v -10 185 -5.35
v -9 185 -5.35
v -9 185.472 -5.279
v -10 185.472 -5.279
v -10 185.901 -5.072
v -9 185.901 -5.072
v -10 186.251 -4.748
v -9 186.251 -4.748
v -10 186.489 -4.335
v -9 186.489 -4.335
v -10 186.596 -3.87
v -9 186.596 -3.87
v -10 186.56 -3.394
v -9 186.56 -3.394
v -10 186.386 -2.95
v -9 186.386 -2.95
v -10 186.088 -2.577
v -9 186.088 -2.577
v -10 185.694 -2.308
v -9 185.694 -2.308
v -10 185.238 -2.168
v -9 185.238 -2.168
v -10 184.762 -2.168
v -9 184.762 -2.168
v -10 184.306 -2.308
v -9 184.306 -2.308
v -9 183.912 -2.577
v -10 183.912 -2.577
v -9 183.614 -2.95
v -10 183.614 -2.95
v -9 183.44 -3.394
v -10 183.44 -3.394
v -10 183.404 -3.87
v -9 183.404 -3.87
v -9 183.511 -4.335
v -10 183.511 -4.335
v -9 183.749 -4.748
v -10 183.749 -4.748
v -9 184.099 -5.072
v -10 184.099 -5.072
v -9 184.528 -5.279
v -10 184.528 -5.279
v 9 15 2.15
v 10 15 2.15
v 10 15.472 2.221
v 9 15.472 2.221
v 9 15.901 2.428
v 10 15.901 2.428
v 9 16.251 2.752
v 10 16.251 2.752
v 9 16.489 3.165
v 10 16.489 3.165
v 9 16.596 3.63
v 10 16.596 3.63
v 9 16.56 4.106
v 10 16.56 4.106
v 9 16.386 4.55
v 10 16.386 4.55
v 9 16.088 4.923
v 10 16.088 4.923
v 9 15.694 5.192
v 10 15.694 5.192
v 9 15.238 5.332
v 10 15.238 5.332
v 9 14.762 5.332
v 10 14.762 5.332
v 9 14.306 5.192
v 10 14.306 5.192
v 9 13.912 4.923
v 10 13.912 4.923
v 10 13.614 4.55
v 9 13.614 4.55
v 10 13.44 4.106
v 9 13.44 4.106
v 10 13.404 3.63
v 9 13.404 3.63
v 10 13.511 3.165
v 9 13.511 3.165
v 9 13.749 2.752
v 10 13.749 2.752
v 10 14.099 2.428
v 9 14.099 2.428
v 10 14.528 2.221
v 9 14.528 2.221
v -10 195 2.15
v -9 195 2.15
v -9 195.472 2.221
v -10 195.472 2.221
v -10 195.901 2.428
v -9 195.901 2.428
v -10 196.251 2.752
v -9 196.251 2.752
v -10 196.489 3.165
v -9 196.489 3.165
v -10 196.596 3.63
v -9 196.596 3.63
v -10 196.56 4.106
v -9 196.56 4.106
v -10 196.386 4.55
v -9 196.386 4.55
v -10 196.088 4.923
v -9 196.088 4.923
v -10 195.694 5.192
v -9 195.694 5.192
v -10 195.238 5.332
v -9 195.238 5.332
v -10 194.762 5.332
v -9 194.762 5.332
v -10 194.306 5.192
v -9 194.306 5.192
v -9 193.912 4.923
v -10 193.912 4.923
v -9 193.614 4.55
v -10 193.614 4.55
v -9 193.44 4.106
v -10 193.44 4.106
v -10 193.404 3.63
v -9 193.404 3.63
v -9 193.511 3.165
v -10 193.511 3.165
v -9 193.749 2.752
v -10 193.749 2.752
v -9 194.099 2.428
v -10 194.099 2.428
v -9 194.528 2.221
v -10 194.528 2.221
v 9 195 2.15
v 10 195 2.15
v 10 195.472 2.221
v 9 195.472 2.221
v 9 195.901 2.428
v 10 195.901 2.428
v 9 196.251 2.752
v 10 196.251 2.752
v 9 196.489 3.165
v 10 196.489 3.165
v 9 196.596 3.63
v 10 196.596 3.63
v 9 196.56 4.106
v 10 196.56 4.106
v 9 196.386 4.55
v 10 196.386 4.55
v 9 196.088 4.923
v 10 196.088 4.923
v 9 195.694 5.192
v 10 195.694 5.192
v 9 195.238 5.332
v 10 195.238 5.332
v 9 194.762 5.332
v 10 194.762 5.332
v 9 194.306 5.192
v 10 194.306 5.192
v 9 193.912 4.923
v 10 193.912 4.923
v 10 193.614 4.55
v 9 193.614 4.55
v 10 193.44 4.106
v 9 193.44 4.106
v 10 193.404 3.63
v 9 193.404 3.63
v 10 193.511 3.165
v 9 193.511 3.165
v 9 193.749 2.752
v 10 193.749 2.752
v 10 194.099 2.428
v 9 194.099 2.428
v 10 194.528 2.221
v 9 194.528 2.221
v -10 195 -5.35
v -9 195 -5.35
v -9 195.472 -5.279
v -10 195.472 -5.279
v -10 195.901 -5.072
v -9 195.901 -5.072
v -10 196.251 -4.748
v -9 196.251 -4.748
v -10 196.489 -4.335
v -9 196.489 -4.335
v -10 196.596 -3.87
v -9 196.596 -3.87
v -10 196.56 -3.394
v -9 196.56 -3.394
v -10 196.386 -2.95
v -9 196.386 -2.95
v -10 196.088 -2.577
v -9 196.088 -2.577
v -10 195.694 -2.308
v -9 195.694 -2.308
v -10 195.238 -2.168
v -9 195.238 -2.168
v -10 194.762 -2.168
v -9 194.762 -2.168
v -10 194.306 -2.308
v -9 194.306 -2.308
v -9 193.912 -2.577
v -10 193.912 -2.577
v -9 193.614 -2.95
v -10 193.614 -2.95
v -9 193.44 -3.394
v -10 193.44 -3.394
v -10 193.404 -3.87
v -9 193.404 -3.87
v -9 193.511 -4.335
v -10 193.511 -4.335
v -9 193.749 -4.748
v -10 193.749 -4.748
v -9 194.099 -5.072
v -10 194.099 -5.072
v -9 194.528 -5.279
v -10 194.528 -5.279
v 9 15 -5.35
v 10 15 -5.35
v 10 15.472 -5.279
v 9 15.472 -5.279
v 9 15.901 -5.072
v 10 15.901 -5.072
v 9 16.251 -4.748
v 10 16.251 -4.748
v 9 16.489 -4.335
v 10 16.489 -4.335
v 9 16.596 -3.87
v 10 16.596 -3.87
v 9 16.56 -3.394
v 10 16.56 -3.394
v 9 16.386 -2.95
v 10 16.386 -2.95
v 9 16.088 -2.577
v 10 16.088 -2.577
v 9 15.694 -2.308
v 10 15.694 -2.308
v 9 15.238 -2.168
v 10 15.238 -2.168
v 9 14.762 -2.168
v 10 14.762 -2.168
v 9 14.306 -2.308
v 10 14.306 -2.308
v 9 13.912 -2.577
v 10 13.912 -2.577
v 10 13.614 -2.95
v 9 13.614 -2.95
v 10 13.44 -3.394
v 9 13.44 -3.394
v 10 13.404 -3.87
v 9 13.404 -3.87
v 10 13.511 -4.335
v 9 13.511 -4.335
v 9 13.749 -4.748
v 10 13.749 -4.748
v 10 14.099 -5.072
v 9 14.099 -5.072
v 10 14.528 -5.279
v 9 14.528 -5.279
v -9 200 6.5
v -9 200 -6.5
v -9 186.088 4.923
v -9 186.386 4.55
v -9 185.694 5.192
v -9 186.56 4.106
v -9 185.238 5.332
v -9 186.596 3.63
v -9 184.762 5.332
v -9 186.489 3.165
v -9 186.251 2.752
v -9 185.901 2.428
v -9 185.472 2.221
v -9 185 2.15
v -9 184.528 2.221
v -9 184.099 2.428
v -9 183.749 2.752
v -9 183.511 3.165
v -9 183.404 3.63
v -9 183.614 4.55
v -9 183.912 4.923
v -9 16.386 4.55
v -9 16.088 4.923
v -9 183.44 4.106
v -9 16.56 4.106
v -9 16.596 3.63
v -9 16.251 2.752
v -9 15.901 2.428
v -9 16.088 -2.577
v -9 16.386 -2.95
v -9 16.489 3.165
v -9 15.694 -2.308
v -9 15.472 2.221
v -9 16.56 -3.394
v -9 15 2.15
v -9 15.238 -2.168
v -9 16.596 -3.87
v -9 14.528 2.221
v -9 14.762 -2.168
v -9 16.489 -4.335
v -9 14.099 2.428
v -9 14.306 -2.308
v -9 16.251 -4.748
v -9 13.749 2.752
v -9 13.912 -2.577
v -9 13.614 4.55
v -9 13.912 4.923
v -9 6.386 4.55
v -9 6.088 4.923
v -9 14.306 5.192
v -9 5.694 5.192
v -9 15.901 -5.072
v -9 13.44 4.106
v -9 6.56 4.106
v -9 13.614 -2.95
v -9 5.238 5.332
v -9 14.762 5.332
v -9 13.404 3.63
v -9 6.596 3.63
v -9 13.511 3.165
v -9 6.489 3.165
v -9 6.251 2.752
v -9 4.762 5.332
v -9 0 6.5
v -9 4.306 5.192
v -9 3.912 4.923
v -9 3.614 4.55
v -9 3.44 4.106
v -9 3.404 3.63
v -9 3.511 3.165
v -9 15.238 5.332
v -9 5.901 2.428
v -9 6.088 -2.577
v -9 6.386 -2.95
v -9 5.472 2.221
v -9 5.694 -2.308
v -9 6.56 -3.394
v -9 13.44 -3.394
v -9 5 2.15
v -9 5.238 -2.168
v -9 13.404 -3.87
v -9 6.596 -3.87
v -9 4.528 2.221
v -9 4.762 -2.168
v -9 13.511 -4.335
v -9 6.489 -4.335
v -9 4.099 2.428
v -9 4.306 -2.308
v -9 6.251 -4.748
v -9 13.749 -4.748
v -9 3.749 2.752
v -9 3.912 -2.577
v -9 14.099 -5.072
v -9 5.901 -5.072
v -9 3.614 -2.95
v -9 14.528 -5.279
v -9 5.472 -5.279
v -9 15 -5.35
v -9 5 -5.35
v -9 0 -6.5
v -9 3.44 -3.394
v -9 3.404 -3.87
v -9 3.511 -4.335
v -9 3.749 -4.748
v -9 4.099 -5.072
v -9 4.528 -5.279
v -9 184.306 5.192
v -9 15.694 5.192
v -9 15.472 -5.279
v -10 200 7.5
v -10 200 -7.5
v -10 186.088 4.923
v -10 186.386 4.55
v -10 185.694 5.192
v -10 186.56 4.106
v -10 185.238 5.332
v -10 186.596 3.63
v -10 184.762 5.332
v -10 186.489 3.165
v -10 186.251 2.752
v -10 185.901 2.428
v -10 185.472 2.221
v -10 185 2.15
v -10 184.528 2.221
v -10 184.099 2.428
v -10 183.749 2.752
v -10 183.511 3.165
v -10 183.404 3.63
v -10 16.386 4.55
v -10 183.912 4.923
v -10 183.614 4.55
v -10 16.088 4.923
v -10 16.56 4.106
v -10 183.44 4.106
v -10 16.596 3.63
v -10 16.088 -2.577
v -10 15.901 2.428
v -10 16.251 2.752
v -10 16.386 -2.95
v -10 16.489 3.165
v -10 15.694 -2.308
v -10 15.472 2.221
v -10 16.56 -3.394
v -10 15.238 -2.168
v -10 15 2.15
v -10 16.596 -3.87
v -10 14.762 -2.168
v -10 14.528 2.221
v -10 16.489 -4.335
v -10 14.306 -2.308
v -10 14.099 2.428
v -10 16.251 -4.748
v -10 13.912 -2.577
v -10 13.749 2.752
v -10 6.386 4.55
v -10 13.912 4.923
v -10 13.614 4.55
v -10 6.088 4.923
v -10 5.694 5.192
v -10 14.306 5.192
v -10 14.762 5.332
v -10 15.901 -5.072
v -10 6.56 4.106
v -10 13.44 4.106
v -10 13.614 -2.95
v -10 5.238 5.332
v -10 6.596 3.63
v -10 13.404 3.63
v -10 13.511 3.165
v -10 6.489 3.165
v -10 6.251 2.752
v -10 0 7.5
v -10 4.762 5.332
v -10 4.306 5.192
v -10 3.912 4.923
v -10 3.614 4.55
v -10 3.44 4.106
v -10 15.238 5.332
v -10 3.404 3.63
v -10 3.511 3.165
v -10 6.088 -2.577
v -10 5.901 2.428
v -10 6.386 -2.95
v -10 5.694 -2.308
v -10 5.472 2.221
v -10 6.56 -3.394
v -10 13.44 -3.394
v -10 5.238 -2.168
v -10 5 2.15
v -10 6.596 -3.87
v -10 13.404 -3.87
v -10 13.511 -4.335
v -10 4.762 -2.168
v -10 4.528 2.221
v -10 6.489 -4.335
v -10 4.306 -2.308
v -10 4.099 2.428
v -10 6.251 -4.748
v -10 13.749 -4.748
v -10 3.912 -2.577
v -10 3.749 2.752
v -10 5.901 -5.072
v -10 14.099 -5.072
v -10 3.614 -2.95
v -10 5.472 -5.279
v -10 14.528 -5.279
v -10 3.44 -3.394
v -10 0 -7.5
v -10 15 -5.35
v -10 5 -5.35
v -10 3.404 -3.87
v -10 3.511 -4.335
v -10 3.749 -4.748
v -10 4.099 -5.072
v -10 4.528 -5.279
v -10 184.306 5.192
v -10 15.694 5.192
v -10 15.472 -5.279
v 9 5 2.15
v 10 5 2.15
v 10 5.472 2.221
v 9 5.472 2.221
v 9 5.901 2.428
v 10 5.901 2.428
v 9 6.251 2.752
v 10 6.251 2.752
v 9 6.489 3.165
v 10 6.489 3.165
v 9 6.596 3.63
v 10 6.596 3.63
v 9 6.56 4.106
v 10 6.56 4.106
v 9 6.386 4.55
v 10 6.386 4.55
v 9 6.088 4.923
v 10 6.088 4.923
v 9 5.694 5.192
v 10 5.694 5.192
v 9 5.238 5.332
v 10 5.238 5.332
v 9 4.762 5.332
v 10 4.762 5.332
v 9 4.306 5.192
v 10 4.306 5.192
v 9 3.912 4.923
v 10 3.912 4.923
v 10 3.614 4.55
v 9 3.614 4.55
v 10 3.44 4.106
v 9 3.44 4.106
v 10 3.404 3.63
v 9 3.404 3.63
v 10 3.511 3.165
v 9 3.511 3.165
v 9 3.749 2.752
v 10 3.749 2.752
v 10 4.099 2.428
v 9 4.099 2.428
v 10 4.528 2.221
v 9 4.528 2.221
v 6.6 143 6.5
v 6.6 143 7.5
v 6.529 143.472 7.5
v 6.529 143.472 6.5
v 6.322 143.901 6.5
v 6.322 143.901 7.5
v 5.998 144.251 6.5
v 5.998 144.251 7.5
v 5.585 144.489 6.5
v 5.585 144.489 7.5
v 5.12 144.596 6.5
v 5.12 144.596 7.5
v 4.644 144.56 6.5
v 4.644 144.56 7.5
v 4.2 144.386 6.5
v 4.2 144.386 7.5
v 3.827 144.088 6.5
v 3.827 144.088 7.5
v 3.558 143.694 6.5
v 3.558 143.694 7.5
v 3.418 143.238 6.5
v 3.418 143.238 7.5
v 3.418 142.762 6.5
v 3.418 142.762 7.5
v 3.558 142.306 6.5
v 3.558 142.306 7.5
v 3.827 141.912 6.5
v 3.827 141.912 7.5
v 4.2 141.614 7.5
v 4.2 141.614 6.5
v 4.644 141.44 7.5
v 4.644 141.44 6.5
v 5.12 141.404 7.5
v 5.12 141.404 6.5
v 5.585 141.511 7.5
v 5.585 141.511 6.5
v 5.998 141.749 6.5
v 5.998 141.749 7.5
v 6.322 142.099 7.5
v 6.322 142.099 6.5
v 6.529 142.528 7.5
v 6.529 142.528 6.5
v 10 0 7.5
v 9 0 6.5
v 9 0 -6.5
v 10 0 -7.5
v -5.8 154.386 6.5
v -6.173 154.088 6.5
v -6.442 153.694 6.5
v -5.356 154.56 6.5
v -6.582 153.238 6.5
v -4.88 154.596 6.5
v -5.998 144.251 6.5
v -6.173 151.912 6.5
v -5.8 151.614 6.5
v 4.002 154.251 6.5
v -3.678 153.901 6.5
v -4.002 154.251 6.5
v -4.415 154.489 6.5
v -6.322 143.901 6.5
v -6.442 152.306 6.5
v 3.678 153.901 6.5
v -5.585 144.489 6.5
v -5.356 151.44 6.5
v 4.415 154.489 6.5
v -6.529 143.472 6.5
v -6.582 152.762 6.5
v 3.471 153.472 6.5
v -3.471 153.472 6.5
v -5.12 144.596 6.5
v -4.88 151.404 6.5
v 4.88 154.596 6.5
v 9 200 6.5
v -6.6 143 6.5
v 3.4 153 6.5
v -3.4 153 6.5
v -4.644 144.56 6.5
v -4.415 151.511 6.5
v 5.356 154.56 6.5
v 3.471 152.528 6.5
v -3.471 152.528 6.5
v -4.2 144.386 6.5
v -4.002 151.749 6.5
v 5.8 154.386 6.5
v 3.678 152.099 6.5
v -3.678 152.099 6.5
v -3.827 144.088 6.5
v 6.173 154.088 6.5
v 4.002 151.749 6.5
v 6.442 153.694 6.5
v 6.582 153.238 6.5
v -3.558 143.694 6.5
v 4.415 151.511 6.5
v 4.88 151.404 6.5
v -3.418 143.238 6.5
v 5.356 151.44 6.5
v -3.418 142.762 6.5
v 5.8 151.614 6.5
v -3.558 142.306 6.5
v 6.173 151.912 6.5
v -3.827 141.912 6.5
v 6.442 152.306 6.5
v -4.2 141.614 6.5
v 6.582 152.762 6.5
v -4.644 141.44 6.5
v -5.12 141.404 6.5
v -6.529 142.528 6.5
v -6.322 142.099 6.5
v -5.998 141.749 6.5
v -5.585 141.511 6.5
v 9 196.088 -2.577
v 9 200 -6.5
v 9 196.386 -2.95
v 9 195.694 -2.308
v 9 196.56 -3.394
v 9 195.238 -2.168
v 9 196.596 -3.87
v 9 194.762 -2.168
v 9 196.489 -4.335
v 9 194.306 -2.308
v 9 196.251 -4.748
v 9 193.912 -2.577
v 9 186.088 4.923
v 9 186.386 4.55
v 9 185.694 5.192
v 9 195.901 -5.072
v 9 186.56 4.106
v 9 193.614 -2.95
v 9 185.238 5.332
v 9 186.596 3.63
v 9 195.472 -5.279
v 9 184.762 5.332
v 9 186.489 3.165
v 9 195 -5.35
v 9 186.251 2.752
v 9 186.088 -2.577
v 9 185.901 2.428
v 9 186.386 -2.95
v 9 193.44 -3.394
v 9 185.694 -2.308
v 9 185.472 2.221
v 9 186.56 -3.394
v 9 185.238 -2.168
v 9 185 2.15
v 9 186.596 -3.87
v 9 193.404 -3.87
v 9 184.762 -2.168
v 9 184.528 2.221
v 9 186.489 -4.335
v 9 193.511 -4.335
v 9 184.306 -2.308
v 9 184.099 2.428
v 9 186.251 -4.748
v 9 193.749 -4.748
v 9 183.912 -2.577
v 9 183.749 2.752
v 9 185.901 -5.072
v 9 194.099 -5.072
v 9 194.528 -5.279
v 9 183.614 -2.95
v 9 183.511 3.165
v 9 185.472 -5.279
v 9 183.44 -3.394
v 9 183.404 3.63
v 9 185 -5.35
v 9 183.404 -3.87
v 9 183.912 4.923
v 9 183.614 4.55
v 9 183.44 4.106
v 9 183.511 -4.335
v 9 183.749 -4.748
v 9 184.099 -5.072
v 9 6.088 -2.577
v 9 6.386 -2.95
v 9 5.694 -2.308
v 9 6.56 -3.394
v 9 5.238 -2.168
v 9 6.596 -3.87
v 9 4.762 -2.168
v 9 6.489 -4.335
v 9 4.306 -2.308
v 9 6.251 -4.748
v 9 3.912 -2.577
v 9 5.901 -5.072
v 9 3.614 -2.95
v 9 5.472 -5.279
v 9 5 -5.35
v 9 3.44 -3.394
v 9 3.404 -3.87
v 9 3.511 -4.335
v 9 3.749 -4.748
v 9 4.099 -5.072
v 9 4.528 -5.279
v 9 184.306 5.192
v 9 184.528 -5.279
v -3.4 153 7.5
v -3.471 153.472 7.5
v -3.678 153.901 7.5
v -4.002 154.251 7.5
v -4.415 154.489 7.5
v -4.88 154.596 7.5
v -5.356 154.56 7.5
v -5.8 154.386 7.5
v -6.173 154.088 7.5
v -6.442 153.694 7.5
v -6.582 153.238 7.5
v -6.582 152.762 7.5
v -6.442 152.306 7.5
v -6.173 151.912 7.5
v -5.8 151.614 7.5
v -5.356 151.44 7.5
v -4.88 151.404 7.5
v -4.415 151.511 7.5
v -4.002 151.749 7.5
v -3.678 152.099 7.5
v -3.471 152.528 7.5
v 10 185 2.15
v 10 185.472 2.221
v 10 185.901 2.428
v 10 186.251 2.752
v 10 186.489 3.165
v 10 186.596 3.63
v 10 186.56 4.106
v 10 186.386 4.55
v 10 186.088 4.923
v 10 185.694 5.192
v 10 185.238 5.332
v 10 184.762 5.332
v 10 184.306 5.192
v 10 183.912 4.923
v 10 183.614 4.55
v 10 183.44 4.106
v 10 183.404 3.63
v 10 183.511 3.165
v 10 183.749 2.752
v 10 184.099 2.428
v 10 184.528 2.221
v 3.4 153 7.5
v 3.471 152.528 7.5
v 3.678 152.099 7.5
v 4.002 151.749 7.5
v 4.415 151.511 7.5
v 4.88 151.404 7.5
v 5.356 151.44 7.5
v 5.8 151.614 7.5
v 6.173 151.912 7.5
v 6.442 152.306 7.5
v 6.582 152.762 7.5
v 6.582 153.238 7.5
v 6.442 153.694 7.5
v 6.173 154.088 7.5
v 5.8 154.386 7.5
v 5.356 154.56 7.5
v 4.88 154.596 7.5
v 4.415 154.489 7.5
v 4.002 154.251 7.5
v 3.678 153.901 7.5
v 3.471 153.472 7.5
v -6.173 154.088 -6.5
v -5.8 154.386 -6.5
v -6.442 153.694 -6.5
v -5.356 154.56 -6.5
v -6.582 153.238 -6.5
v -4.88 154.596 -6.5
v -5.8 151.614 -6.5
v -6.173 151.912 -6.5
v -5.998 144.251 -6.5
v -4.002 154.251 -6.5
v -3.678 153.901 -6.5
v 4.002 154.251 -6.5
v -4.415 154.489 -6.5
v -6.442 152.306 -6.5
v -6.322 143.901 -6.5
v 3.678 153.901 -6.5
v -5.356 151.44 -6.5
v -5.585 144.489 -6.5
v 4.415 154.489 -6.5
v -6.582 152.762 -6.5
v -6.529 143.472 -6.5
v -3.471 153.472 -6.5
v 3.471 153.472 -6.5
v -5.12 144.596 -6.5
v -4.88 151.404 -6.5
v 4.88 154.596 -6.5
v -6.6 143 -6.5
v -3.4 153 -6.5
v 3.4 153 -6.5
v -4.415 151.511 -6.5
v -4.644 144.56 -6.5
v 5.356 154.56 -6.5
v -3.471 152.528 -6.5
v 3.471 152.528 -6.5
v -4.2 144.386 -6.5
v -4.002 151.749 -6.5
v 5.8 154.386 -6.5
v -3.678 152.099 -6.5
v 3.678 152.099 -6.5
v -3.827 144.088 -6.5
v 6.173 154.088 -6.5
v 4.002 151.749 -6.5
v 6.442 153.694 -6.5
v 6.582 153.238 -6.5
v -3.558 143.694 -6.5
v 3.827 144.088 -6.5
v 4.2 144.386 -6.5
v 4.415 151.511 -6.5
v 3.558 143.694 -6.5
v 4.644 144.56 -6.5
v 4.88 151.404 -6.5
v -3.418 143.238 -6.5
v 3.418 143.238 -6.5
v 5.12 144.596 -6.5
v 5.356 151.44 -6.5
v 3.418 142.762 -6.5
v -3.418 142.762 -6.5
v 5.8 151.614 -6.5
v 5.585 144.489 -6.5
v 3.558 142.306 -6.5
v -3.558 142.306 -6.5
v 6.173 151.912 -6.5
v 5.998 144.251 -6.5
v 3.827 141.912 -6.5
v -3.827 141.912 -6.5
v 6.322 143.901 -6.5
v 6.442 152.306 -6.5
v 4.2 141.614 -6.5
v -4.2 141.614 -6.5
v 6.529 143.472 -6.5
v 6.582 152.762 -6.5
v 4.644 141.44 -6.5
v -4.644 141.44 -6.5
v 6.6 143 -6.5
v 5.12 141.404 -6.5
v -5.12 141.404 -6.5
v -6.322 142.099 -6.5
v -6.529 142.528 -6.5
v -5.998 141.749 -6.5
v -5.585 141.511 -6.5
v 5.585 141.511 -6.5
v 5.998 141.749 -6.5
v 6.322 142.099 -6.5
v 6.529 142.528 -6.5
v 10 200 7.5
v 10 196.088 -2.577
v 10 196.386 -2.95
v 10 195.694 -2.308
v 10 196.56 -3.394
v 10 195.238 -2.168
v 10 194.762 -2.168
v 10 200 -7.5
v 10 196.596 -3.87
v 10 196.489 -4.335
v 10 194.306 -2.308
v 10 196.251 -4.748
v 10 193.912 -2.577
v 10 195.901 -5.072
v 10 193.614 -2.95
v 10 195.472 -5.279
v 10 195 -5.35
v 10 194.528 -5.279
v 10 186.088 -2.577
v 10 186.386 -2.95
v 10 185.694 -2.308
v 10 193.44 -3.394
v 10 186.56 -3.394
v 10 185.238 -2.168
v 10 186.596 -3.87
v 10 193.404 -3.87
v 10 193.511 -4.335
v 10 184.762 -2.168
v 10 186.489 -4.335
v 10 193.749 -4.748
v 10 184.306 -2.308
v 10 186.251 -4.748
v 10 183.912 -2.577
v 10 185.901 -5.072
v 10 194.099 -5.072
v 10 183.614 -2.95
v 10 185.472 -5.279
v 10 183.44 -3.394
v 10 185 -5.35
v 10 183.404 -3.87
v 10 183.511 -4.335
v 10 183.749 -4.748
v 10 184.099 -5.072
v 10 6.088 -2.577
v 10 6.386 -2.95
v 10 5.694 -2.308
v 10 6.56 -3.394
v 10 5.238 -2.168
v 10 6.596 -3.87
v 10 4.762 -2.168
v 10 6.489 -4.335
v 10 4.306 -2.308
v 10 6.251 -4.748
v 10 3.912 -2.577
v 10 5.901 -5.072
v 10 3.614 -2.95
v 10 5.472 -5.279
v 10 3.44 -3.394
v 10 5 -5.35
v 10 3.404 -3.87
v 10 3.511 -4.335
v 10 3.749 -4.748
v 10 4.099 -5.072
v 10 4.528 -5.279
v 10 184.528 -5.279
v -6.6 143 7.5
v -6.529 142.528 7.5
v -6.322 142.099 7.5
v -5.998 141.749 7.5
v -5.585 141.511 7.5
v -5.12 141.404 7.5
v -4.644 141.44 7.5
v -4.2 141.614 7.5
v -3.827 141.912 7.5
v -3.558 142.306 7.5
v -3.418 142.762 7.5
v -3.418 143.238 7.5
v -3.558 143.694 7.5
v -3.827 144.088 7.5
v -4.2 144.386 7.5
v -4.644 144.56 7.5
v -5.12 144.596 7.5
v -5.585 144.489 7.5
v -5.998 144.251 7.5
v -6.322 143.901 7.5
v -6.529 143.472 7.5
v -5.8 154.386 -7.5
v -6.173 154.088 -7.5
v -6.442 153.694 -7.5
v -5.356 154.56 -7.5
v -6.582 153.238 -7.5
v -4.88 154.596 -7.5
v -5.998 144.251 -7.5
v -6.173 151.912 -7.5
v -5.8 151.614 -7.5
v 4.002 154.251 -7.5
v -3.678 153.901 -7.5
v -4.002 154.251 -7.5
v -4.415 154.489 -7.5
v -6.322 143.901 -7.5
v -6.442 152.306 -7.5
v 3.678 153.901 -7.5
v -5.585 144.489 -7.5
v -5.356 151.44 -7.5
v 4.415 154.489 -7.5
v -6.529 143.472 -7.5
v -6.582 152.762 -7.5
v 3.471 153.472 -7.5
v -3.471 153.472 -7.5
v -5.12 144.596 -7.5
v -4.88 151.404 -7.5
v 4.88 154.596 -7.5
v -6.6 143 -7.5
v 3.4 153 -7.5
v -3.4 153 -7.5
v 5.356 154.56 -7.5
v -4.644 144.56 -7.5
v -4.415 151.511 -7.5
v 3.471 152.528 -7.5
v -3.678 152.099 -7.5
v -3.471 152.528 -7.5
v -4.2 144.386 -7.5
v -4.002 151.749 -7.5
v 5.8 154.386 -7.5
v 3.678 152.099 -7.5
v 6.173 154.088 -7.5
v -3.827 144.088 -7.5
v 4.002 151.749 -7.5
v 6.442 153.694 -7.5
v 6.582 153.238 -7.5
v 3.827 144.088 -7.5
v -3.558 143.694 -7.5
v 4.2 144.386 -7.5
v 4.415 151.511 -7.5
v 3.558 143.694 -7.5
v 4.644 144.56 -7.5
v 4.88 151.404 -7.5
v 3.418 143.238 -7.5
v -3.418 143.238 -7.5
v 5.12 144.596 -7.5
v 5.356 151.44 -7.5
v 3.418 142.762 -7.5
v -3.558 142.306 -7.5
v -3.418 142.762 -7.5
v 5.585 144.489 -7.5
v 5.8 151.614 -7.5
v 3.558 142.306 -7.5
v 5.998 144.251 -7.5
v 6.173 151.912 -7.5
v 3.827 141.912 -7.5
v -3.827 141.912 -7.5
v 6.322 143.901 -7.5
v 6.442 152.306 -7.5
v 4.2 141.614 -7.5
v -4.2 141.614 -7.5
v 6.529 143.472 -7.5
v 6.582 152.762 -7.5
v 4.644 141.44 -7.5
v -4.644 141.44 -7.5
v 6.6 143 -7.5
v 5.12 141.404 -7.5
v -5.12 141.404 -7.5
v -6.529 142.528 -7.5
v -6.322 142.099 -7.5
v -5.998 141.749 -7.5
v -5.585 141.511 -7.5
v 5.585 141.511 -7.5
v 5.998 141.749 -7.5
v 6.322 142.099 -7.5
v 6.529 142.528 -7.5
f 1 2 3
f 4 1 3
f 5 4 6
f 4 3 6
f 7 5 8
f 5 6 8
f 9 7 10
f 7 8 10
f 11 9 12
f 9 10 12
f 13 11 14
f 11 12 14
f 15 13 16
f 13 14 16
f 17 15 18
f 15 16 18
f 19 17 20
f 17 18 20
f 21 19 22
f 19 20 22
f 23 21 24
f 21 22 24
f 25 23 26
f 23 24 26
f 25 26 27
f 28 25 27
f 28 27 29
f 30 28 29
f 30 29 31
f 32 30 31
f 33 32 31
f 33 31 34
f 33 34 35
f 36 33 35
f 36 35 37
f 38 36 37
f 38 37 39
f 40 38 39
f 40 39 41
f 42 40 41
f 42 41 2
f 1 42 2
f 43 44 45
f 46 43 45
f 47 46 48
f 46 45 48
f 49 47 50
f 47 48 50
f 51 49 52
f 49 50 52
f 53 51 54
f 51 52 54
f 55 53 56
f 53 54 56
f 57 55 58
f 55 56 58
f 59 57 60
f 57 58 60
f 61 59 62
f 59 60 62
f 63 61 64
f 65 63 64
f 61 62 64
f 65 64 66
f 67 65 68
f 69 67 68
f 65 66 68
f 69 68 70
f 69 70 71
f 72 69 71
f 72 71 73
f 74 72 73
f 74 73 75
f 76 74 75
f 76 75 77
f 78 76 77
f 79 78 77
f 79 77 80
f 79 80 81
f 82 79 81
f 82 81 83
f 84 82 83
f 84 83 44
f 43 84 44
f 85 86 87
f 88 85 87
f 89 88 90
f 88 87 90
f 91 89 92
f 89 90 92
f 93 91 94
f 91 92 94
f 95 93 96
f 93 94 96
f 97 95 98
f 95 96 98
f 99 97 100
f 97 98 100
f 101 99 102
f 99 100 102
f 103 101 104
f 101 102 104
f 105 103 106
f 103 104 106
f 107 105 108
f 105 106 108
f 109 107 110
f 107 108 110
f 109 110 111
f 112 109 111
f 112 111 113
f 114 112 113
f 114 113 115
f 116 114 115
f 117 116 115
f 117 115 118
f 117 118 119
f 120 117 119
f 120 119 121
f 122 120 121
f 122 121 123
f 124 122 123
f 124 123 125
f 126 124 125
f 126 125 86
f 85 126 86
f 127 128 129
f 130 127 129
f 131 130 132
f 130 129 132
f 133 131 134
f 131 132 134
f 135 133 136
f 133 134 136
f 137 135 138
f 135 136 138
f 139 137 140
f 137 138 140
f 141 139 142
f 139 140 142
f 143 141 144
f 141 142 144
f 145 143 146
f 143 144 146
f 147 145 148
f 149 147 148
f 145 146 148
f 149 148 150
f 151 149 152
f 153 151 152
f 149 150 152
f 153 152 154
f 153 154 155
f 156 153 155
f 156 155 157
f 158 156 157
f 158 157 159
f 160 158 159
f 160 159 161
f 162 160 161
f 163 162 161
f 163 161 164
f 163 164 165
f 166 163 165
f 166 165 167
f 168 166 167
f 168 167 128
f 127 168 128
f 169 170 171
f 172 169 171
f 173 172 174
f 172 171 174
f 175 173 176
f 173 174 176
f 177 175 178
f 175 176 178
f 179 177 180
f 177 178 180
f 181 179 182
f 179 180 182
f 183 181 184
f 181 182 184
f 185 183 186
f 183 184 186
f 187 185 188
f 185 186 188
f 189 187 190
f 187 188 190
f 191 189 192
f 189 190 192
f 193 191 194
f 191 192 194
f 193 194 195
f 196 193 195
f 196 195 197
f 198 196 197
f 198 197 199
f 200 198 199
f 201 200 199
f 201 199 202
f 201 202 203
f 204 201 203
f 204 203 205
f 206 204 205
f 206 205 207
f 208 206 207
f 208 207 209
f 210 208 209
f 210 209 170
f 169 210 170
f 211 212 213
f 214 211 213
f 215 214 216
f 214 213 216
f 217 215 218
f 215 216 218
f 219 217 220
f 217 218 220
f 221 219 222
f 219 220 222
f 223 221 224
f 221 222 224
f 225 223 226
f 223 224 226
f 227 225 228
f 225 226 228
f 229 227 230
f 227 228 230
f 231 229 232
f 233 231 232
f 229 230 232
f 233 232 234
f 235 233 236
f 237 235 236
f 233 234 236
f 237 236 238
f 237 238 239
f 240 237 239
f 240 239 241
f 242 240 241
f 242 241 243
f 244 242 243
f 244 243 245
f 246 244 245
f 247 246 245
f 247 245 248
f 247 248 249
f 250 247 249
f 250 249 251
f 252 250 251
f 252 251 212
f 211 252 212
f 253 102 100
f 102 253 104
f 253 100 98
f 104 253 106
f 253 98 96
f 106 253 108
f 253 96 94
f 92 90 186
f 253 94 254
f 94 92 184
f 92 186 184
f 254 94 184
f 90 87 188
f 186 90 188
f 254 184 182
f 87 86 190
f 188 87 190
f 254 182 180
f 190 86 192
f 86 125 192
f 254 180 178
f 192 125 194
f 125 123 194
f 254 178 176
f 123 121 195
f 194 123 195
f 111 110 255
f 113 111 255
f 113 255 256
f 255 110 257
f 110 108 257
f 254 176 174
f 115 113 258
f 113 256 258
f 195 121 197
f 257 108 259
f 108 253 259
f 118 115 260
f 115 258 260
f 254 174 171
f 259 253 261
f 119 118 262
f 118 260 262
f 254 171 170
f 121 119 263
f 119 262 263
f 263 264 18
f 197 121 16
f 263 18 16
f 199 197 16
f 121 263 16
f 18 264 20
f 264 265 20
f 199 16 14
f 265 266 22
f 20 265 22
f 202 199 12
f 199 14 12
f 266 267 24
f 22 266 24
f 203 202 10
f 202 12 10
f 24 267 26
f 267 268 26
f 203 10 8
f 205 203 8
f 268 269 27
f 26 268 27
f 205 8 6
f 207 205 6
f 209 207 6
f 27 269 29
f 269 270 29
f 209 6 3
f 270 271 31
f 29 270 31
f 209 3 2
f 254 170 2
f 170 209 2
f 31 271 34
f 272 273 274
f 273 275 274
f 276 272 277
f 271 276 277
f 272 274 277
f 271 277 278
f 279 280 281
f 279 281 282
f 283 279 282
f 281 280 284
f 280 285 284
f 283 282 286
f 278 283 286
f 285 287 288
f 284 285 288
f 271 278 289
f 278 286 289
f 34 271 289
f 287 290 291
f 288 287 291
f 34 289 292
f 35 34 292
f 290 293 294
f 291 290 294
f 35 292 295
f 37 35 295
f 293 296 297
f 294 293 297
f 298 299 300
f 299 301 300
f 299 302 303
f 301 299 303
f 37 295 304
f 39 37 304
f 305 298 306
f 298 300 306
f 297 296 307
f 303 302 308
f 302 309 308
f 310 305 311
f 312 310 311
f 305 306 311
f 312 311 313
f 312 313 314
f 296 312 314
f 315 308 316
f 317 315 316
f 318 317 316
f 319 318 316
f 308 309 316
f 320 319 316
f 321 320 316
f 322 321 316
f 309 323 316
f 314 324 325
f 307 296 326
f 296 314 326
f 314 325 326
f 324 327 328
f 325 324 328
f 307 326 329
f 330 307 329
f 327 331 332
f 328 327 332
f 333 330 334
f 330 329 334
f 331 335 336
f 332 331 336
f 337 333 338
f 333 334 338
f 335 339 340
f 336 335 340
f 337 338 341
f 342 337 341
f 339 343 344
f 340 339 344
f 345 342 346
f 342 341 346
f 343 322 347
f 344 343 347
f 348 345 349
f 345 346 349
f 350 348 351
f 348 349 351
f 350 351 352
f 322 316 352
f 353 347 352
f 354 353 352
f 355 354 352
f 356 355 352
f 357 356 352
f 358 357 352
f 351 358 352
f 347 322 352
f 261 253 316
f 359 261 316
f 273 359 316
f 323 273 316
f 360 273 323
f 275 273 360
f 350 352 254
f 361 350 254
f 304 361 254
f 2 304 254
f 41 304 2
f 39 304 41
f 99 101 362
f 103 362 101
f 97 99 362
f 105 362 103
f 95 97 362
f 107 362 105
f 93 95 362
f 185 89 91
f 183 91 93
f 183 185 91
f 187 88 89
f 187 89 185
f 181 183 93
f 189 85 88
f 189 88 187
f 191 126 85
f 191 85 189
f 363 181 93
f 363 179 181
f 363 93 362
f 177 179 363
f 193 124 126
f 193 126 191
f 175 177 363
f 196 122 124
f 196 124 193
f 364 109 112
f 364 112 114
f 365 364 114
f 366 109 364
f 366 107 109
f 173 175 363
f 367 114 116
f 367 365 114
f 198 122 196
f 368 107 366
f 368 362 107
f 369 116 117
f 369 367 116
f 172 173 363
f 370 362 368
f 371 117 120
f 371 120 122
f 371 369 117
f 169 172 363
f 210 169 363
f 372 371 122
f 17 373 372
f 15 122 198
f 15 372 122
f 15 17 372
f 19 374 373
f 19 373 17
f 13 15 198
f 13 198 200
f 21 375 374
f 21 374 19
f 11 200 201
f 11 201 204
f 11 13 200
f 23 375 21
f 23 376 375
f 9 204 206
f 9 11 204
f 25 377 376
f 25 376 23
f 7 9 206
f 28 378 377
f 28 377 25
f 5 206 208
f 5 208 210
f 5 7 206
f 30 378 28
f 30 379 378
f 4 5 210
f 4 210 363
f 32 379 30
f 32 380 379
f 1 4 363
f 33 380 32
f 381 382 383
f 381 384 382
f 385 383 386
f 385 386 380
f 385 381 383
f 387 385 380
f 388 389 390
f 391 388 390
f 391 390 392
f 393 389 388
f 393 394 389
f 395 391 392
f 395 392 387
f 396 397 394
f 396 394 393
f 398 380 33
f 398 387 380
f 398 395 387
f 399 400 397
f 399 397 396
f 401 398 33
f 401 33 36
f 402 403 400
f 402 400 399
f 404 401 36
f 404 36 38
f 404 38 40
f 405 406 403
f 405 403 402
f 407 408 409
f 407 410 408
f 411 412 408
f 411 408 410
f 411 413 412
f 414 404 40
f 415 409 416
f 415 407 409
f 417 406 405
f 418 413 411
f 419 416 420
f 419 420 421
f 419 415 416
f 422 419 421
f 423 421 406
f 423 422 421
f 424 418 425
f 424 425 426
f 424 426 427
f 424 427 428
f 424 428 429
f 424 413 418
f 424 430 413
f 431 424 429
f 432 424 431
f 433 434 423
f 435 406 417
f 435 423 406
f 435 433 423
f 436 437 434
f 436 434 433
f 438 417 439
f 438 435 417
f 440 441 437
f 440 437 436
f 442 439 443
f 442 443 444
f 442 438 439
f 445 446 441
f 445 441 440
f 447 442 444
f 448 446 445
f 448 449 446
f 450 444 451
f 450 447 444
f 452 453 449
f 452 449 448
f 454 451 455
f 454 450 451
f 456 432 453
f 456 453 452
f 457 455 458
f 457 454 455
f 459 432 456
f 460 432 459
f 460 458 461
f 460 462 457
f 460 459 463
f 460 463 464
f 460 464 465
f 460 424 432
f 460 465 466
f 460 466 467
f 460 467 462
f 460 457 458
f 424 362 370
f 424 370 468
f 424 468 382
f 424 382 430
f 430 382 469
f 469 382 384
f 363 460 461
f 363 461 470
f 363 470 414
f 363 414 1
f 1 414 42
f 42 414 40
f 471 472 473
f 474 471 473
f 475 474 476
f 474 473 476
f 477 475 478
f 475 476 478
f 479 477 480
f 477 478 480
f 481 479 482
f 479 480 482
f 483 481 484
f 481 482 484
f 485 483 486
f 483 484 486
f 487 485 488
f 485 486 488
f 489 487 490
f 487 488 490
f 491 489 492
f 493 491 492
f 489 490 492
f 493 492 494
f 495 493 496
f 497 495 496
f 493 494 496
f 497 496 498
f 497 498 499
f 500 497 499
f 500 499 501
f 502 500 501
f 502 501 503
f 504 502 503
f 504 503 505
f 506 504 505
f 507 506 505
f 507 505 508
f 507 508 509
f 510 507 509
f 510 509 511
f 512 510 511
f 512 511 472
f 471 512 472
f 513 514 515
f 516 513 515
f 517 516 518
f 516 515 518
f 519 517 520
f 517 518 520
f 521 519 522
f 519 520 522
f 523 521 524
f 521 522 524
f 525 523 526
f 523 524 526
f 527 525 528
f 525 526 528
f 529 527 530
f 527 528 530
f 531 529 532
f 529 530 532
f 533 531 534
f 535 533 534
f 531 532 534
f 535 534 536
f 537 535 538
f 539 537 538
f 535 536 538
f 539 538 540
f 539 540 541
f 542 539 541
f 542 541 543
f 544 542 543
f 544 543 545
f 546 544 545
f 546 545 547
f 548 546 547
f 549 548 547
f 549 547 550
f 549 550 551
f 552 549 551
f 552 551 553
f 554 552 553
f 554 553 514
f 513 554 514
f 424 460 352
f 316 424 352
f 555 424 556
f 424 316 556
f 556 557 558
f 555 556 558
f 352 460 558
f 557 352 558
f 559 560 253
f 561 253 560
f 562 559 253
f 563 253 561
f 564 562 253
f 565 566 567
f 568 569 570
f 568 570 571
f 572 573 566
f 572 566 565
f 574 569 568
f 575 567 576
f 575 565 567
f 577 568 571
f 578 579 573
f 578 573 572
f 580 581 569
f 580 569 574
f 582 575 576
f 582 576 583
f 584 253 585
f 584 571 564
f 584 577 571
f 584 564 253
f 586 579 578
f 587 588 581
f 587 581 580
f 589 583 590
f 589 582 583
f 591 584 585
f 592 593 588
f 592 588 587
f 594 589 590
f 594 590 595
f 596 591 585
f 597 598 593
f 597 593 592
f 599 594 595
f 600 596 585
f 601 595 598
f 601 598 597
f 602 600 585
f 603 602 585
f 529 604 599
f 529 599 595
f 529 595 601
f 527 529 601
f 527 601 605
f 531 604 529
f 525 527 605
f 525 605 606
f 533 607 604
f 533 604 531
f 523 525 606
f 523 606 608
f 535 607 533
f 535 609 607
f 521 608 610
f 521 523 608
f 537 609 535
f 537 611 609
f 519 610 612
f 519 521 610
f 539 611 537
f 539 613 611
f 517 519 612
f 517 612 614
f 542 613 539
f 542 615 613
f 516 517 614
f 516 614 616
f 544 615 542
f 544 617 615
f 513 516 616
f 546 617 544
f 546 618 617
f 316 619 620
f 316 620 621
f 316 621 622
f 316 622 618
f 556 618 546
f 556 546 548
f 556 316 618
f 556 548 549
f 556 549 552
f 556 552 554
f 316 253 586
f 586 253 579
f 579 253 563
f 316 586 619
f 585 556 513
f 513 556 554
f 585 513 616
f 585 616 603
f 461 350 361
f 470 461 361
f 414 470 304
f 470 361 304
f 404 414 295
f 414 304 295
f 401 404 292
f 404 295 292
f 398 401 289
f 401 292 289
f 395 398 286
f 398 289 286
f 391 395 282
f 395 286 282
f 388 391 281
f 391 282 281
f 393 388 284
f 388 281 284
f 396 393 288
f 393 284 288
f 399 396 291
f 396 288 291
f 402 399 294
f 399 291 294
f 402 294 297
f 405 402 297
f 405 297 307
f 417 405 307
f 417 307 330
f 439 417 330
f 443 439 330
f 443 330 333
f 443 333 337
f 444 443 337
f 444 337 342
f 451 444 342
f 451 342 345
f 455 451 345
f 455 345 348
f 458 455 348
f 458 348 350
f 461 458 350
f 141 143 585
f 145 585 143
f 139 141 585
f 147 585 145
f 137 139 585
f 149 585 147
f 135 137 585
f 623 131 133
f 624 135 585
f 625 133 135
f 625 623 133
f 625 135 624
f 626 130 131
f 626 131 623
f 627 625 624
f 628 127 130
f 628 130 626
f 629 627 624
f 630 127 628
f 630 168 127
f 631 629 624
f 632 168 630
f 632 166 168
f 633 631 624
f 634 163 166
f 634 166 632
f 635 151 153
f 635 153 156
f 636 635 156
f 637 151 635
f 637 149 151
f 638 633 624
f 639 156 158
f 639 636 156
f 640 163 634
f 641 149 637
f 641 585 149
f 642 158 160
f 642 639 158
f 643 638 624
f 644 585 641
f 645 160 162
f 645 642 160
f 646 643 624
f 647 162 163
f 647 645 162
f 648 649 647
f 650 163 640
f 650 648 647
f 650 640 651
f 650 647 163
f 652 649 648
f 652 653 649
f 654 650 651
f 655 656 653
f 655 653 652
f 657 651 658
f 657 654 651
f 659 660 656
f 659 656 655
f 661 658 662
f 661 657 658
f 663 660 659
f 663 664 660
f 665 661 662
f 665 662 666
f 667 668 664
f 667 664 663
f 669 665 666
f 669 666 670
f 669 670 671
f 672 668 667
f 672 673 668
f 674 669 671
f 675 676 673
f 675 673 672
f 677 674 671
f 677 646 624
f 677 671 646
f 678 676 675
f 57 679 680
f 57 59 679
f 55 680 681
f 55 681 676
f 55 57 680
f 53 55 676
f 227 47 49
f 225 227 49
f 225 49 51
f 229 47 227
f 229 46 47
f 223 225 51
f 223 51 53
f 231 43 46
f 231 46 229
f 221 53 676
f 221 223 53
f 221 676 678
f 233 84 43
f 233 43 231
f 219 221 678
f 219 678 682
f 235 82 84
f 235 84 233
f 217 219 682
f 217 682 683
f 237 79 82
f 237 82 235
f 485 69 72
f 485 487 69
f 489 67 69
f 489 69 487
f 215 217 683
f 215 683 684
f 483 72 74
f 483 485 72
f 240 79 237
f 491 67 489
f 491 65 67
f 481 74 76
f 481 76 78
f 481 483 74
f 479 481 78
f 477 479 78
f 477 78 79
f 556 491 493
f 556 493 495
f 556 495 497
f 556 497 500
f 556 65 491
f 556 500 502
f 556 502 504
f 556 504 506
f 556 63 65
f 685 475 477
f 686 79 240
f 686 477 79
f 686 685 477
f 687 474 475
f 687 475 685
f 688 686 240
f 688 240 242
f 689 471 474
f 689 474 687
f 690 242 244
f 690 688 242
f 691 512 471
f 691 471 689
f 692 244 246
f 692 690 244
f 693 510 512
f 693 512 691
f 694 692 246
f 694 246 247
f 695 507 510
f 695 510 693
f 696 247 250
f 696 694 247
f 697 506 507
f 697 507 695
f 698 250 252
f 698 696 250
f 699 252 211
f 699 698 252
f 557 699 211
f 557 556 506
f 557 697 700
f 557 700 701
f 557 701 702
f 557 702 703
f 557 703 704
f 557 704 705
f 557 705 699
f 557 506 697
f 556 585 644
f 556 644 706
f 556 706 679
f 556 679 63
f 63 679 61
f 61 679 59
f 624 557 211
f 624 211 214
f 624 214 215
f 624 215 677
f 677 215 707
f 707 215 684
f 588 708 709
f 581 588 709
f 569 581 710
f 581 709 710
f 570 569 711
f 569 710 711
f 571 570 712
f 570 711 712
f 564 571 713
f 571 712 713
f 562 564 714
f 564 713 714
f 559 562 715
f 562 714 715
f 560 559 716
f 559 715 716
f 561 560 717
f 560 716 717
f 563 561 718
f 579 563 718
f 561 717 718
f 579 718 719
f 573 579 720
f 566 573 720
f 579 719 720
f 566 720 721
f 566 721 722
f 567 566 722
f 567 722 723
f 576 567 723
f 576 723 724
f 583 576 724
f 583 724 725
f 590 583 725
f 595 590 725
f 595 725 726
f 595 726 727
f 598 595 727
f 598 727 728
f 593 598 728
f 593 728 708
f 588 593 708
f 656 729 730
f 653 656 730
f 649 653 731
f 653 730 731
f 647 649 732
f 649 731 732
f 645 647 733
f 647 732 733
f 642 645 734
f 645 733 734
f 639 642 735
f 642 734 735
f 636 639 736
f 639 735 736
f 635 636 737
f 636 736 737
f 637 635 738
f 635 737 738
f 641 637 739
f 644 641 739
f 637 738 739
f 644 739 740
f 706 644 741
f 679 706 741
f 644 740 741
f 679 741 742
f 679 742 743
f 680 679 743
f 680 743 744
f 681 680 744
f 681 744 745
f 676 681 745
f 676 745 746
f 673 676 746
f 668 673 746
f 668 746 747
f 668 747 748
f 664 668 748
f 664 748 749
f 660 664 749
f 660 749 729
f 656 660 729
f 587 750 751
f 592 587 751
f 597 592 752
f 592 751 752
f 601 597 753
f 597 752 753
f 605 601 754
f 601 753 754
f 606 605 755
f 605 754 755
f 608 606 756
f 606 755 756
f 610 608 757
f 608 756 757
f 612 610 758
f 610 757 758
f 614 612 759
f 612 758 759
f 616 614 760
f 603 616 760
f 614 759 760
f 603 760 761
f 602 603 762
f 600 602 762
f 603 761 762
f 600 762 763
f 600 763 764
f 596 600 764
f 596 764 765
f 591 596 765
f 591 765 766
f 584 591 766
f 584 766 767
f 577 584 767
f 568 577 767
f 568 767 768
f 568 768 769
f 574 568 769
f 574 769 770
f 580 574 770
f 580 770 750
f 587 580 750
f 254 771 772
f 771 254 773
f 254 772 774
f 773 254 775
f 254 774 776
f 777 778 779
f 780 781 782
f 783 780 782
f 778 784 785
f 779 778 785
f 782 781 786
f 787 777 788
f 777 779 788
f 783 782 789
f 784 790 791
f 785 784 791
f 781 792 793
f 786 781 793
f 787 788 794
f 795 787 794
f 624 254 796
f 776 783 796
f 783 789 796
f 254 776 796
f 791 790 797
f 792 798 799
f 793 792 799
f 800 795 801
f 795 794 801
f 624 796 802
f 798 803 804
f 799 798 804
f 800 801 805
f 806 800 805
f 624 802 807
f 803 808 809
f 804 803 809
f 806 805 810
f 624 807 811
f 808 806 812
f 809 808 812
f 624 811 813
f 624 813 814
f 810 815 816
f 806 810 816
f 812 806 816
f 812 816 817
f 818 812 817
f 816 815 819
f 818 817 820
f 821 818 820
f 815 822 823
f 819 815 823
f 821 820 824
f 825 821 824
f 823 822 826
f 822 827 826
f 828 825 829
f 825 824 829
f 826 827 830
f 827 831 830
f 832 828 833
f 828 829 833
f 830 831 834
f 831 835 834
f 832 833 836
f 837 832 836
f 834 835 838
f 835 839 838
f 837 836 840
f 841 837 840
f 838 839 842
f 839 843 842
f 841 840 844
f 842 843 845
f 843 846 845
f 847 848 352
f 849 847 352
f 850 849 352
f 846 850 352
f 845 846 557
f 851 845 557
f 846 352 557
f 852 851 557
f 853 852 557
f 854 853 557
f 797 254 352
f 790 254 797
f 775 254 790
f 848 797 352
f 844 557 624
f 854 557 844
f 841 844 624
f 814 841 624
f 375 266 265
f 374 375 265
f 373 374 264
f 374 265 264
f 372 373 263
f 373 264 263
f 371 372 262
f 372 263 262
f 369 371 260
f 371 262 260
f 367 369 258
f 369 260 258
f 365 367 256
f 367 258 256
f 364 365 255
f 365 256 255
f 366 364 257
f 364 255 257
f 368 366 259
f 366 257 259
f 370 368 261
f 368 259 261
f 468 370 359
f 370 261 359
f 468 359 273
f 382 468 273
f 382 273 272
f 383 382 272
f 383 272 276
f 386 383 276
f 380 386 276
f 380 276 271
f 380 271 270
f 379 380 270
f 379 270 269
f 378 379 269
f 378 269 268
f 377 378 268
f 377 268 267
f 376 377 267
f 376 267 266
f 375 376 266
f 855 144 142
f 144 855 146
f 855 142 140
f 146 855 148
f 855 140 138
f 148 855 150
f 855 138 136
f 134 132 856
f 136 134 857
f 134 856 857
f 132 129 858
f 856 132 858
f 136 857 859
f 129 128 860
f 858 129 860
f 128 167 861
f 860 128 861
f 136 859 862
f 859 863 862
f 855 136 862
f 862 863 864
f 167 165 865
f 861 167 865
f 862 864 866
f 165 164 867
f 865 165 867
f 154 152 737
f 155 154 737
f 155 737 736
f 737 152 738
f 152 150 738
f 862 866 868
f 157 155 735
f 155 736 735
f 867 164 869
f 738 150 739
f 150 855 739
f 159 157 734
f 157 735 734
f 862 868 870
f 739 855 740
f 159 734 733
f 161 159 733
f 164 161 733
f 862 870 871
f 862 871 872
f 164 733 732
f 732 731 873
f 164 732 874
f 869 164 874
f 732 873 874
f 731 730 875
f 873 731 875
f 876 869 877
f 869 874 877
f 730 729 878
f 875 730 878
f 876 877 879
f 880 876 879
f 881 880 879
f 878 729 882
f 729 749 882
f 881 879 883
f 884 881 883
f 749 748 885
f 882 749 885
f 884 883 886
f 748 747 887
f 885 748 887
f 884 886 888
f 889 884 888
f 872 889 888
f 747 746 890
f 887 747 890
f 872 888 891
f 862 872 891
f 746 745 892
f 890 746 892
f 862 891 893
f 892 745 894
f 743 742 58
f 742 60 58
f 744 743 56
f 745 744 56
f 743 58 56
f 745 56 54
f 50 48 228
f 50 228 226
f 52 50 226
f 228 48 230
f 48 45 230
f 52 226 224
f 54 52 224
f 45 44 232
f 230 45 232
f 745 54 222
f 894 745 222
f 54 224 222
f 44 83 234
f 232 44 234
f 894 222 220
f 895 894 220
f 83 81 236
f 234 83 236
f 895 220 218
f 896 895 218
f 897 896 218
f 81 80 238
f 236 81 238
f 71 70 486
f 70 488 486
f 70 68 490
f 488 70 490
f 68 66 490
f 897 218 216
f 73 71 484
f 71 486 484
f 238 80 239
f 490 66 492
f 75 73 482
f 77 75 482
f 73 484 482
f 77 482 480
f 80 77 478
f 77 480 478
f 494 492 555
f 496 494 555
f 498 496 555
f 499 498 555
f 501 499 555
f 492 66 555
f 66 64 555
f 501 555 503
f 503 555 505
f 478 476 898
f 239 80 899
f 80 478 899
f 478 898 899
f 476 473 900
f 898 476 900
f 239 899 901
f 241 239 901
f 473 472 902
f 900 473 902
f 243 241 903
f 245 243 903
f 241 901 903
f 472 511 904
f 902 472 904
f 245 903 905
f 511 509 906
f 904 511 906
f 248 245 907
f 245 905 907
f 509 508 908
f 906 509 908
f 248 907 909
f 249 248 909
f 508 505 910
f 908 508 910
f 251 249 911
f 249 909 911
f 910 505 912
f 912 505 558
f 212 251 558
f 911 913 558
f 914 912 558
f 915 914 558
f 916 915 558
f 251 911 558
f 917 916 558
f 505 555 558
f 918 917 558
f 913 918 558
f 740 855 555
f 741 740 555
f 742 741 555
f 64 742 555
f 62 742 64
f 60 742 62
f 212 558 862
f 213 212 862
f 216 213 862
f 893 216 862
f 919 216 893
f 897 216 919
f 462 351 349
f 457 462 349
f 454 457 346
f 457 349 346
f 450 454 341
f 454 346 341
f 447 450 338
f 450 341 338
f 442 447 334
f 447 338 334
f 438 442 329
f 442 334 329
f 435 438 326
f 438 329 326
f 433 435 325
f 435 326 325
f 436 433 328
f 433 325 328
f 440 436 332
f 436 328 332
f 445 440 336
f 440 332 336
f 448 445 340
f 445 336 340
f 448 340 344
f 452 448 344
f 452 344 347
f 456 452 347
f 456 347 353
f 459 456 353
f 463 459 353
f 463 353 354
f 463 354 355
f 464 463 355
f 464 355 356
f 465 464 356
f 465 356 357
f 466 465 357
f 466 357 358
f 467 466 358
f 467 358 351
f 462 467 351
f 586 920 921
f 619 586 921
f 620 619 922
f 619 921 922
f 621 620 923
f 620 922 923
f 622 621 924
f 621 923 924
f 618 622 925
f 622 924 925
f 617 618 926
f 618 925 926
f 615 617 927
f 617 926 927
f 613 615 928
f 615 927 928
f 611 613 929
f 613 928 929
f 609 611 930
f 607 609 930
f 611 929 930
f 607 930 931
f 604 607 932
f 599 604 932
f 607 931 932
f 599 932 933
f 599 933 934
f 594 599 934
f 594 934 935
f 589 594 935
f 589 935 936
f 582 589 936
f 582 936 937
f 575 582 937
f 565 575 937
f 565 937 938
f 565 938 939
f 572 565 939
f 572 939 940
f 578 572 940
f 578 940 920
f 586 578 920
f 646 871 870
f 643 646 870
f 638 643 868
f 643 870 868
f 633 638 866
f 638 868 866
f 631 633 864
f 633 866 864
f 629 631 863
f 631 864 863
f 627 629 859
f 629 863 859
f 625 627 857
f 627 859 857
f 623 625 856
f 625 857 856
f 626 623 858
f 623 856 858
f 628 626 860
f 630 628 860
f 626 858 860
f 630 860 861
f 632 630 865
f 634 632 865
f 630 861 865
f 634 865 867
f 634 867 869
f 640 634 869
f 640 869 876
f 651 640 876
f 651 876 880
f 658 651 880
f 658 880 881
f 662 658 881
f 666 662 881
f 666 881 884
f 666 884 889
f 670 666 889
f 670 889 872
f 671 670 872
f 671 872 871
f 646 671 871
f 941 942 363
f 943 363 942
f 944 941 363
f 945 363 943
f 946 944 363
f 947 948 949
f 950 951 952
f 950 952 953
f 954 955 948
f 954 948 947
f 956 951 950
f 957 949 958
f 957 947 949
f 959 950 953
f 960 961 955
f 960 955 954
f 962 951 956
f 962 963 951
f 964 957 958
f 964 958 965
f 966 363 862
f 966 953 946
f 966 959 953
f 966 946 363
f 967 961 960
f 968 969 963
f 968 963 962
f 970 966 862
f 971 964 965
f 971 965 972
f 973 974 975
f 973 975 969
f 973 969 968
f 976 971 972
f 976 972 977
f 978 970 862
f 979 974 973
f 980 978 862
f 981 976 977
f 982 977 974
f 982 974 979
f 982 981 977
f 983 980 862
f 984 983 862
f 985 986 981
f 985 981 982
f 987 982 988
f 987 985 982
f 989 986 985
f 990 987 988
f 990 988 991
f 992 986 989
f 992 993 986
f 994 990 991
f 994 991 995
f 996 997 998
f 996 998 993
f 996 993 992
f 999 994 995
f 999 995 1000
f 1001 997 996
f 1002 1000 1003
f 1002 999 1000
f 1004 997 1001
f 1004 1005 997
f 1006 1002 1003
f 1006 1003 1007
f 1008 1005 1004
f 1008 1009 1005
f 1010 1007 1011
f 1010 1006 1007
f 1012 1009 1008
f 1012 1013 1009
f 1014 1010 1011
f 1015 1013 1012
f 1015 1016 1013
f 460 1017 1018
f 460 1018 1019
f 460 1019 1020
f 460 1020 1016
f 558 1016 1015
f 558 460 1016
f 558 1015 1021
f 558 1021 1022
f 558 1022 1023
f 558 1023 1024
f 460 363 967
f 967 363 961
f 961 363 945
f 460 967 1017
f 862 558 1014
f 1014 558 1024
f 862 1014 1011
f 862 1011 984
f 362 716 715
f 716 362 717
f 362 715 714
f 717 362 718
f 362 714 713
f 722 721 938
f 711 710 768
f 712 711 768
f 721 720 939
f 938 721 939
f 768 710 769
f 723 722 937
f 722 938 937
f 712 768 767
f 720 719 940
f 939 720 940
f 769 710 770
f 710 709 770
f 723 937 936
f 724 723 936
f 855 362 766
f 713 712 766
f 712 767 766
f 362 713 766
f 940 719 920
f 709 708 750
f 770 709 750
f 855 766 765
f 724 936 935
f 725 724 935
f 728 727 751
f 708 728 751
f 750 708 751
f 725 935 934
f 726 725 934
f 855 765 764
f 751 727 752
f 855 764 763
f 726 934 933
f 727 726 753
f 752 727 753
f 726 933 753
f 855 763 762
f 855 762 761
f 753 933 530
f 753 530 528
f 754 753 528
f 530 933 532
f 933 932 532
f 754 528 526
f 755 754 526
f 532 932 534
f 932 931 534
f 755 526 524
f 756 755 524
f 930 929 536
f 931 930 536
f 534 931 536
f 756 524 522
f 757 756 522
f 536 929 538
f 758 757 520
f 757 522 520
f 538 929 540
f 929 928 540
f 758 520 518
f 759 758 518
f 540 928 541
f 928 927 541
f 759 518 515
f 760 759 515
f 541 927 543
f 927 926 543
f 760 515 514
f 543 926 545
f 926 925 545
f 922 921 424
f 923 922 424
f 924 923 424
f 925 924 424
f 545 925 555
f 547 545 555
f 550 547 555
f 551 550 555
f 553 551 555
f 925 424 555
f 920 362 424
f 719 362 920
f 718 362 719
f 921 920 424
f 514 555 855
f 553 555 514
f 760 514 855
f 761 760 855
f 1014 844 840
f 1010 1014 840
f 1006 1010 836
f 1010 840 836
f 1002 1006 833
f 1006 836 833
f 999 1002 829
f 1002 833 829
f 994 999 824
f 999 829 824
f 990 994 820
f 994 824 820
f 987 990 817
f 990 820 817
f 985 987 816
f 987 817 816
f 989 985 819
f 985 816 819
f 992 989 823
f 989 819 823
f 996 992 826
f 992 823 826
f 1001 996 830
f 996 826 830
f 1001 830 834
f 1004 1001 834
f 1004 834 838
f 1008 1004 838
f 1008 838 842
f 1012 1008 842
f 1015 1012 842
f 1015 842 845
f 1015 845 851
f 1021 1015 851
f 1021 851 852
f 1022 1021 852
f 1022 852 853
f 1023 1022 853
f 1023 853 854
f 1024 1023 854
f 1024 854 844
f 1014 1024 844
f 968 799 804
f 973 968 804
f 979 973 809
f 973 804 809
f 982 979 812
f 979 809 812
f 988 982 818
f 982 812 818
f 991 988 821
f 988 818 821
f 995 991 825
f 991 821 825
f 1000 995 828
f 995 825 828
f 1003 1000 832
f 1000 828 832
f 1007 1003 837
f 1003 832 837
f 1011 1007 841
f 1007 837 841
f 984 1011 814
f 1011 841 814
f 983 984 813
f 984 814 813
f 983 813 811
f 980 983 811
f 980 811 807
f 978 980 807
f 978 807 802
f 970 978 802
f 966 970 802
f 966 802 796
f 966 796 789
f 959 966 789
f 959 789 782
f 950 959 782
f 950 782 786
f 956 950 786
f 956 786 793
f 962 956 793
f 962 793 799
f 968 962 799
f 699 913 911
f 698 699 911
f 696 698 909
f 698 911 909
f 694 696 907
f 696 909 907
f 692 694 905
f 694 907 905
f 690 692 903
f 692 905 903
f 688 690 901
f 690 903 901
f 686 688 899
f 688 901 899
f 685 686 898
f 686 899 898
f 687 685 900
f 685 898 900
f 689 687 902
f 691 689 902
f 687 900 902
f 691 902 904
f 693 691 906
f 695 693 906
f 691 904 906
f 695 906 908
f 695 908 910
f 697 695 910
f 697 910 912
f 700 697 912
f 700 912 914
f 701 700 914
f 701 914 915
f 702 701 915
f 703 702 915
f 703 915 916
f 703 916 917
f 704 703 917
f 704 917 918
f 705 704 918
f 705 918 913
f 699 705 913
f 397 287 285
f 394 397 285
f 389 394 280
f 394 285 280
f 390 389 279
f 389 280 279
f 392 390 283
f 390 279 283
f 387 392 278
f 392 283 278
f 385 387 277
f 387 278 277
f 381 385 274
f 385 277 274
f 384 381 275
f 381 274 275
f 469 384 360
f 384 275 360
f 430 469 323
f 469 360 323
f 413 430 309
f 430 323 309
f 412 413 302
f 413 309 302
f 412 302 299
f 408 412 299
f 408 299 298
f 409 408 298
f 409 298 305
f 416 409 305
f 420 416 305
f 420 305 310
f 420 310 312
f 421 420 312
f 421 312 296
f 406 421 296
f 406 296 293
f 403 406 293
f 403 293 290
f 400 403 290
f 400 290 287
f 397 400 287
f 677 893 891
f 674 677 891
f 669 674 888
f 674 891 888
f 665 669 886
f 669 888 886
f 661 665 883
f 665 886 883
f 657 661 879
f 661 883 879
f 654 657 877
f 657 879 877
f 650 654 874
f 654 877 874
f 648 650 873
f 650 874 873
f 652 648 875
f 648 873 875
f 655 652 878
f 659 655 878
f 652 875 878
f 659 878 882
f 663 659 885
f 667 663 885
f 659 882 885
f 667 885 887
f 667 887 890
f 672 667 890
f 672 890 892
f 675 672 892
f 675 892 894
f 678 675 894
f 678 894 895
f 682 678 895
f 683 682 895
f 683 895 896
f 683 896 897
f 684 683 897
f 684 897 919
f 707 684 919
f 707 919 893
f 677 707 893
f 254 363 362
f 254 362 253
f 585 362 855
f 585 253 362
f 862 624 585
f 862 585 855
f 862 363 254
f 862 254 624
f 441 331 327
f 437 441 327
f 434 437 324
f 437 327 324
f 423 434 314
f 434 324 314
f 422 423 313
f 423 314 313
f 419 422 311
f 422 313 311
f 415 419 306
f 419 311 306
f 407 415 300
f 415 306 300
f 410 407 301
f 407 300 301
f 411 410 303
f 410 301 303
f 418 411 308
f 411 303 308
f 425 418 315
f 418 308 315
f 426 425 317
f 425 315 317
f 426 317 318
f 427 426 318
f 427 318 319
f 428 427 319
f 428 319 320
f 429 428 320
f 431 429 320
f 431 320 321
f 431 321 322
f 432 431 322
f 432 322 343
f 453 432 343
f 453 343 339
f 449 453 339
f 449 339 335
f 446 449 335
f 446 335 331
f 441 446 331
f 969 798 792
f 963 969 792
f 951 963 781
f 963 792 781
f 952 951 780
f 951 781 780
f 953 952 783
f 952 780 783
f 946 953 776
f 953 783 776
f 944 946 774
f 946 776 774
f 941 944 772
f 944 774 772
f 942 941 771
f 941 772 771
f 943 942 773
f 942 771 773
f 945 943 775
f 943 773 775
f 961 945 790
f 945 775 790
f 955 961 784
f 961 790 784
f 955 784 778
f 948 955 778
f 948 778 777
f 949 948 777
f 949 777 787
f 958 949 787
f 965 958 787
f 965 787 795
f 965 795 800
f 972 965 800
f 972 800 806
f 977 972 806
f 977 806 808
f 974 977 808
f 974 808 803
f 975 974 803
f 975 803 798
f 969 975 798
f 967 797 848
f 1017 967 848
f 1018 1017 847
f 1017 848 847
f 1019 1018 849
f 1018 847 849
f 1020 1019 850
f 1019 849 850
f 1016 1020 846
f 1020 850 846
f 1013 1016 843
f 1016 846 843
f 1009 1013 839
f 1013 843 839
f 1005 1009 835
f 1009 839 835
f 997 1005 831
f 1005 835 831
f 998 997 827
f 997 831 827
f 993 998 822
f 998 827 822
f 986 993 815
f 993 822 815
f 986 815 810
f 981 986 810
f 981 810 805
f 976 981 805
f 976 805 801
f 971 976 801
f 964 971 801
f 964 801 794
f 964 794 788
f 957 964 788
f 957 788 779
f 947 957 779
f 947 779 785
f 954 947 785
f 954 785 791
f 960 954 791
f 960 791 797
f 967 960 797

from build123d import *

# Parameters (mm, degrees)
SKETCH_1_W          = 20
SKETCH_1_H          = 15
SKETCH_1_W_2        = 18
SKETCH_1_H_2        = 13
EXTRUDE_1_DEPTH     = 200
SKETCH_3_R          = 1.6
CUT_EXTRUDE_1_DEPTH = 201.81085628
SKETCH_4_R          = 1.6
CUT_EXTRUDE_2_DEPTH = 202.137390855


with BuildPart() as part:
    # 草图1 → 拉伸-薄壁1 (new body)
    with BuildSketch(Plane(origin=(0, 0, 0), x_dir=(1, 0, 0), z_dir=(0, 1, 0))):
        Rectangle(SKETCH_1_W, SKETCH_1_H)
        Rectangle(SKETCH_1_W_2, SKETCH_1_H_2, mode=Mode.SUBTRACT)
    extrude(amount=EXTRUDE_1_DEPTH)

    # 草图3 → 切除-拉伸1 (cut, through all)
    with BuildSketch(Plane.XY.offset(7.5)):
        with Locations((-5, 153)):
            Circle(SKETCH_3_R)
        with Locations(Location((-5, 143, 0), (0, 0, 180))):
            Circle(SKETCH_3_R)
        with Locations((5, 143)):
            Circle(SKETCH_3_R)
        with Locations(Location((5, 153, 0), (0, 0, 180))):
            Circle(SKETCH_3_R)
    extrude(amount=-CUT_EXTRUDE_1_DEPTH, mode=Mode.SUBTRACT)

    # 草图4 → 切除-拉伸2 (cut, through all)
    with BuildSketch(Plane(origin=(10, 0, 0), x_dir=(0, 0, -1), z_dir=(1, 0, 0))):
        with Locations((-3.75, 5)):
            Circle(SKETCH_4_R)
        with Locations((-3.75, 15)):
            Circle(SKETCH_4_R)
        with Locations((3.75, 5)):
            Circle(SKETCH_4_R)
        with Locations((3.75, 15)):
            Circle(SKETCH_4_R)
        with Locations((3.75, 185)):
            Circle(SKETCH_4_R)
        with Locations((3.75, 195)):
            Circle(SKETCH_4_R)
        with Locations((-3.75, 185)):
            Circle(SKETCH_4_R)
        with Locations((-3.75, 195)):
            Circle(SKETCH_4_R)
    extrude(amount=-CUT_EXTRUDE_2_DEPTH, mode=Mode.SUBTRACT)


solid = part.part
